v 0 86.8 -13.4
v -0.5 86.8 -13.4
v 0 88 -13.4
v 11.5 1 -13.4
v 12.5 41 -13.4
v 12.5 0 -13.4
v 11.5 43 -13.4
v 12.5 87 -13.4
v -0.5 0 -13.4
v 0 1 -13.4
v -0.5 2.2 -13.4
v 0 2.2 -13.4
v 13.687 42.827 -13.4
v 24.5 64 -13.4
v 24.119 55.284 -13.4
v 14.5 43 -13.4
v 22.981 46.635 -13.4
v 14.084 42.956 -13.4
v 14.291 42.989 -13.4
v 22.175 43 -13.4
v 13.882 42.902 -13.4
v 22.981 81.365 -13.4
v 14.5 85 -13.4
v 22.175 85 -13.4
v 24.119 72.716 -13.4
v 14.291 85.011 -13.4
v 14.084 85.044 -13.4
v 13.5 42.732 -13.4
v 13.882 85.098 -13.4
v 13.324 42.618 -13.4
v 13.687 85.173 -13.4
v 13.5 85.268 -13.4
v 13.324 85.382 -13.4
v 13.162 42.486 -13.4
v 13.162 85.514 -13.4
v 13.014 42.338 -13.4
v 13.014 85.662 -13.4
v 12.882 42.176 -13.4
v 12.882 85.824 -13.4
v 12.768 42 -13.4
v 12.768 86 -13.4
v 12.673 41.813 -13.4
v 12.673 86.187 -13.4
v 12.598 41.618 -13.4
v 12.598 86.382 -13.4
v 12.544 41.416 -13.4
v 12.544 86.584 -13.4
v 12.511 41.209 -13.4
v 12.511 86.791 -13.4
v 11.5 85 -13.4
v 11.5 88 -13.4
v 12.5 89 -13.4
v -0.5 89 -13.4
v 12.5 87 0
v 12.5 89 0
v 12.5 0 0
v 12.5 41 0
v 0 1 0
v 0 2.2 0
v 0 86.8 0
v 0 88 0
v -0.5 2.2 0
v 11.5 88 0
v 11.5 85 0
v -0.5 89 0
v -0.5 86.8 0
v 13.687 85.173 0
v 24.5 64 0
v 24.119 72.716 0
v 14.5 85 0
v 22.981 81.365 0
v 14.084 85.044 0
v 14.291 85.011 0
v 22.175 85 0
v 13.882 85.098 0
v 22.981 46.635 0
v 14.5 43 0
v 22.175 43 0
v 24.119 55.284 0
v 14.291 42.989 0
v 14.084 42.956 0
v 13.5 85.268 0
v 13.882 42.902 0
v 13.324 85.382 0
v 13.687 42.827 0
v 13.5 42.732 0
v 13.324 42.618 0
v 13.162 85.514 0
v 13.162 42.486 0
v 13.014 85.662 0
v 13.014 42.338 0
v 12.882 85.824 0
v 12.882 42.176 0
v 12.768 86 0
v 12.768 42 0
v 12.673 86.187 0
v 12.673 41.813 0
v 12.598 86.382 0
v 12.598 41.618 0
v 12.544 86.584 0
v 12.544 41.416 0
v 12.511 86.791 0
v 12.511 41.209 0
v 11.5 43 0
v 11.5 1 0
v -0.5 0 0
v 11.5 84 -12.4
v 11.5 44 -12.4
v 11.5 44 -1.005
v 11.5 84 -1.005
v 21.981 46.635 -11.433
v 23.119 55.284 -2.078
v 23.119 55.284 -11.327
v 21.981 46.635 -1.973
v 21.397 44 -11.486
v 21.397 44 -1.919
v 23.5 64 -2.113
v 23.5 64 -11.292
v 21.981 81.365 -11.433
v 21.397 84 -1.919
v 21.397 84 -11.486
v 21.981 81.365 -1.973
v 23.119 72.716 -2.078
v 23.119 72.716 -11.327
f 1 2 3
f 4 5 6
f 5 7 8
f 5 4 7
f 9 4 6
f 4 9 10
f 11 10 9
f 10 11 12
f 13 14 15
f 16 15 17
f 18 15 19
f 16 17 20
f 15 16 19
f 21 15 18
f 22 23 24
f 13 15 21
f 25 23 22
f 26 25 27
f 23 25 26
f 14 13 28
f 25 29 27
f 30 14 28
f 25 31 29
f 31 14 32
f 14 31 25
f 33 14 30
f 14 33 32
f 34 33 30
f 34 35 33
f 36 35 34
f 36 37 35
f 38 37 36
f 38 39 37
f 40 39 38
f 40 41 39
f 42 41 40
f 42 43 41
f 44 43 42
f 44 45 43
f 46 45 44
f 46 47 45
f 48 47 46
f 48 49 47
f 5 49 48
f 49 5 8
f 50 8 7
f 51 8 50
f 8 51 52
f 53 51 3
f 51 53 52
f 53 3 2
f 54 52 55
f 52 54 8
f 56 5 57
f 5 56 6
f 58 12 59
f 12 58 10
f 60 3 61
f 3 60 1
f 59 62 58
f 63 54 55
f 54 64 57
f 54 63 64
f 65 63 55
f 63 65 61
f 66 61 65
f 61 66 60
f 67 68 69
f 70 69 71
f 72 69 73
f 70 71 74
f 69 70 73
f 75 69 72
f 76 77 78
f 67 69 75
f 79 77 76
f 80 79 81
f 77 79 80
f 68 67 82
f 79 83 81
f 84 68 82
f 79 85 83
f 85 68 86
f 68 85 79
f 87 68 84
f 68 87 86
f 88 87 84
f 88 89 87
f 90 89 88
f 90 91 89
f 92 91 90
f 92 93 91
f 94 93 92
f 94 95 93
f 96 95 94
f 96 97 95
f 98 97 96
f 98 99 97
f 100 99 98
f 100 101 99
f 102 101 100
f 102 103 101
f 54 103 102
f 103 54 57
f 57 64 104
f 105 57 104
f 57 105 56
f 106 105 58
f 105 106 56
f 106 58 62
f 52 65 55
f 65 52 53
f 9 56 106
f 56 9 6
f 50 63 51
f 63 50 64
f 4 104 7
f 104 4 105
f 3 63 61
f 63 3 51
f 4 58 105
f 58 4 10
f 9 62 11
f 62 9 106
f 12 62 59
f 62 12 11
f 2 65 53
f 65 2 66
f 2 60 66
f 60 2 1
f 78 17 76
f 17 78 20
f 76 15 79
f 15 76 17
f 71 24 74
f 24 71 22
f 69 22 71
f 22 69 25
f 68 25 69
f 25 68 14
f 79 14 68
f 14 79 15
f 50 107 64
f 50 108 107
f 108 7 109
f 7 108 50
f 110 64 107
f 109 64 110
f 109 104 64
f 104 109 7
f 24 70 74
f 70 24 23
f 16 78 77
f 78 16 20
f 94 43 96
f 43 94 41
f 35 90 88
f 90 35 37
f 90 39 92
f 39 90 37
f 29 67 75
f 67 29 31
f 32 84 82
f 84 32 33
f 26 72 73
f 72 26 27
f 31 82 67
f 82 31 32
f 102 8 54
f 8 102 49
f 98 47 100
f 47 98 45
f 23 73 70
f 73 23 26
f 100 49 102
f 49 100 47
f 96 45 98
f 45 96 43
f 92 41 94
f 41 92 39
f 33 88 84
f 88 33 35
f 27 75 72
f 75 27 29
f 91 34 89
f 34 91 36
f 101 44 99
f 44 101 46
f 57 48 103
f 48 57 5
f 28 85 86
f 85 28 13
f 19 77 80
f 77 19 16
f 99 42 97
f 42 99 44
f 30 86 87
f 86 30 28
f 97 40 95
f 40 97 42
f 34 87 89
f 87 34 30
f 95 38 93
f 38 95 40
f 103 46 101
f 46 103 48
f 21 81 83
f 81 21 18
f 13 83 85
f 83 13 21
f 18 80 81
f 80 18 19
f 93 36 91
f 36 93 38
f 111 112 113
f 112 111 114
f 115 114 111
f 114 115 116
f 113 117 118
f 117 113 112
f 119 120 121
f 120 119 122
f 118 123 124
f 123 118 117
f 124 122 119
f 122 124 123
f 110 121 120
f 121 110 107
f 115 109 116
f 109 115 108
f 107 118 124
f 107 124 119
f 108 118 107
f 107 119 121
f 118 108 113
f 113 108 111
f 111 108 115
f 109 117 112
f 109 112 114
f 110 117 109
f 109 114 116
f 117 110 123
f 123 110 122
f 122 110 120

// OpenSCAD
// Switch cover
// Paul Murrin - Sept 2013

// (mm)
HeightOfSocket = 87;
// (mm) 
DepthOfSocket = 11.5;
// (mm)
HeightToBottomOfSwitch = 48;
// (mm)
WidthOfSwitch = 10;
// (mm)
DepthOfSwitch = 5;
// The clip helps to grip the switch plate. If not possible, use blue tack.
IncludeClips = true;

/* [Hidden] */

Thickness = 1;			// Thickness of cover
WidthExtraMargin = 0.5;	// Additional tolerance on width of cover.
Taper = 1.2;				// Amount which switch cover tapers (helps make it printable without massive overhang)
ClipLength = Thickness + 1.2;	// Length of clip that helps hold it on 
ClipThickness = 0.5;
WidthAtBase = WidthOfSwitch + 2*WidthExtraMargin + 2*Taper;
HeightOfCover=DepthOfSwitch+7;	// Height of the inside of the cover
LengthOfCover=40;	// Length of the inside of the cover
HeightToStartOfCover = HeightToBottomOfSwitch - 5 - Thickness;
FilletRadius = 2;
$fa=5;



rotate([0,90,0])
	union()
	{
		// Main body and cutout
		difference()
		{
			cube([WidthAtBase, HeightOfSocket+2*Thickness, DepthOfSocket + Thickness]);
			translate([0,Thickness,0])
				cube([WidthAtBase, HeightOfSocket, DepthOfSocket]);
			// Cutout for coverplate
			translate([0,Thickness + HeightToStartOfCover,DepthOfSocket])
				cube([WidthAtBase, LengthOfCover+2*Thickness, Thickness]);
		}
	
		// Clips to grip coverplate
		if (IncludeClips)
		{
			translate([0,0,-ClipThickness])
				cube([WidthAtBase, ClipLength, ClipThickness]);
			translate([0,HeightOfSocket+2*Thickness-ClipLength,-ClipThickness])
				cube([WidthAtBase, ClipLength, ClipThickness]);
		}
	
		
		// Cover bulge
		translate([0,HeightToStartOfCover+Thickness,DepthOfSocket])
		{
			difference()
			{
				union()
				{
					intersection()
					{
						translate([0,LengthOfCover/2+Thickness,(HeightOfCover+Thickness)-100])
							rotate([0,90,0])
								cylinder(r=100, h=WidthAtBase);
						cube([WidthAtBase,LengthOfCover+2*Thickness,HeightOfCover+Thickness]);
					}
					// Fillet at top
					translate([0,LengthOfCover+2*Thickness,Thickness])
						difference()
						{	
							cube([WidthAtBase,FilletRadius,FilletRadius]);
							translate([-0.01,FilletRadius,FilletRadius])	
								rotate([0,90,0])
									cylinder(r=FilletRadius, h=WidthAtBase+0.02, $fn=60);
						}
					// Fillet at bottom
					translate([0,-FilletRadius,Thickness])
						difference()
						{	
							cube([WidthAtBase,FilletRadius,FilletRadius]);
							#translate([-0.01,0,FilletRadius])	
								rotate([0,90,0])
									cylinder(r=FilletRadius, h=WidthAtBase+0.02, $fn=60);
						}
	
				}
				// Taper the cover
/*				translate([WidthAtBase,-FilletRadius, 0])
					rotate([0,-atan2(Taper, HeightOfCover+Thickness),0])
						cube([Taper,LengthOfCover+2*Thickness+2*FilletRadius,HeightOfCover+Thickness+10]);
				translate([-Taper,-FilletRadius, 0])
					rotate([0,atan2(Taper, HeightOfCover+Thickness),0])
						cube([Taper,LengthOfCover+2*Thickness+2*FilletRadius,HeightOfCover+Thickness+10]);
*/		
				// Cutout inside of cover
				difference()
				{
					intersection()
					{
						translate([Thickness,(LengthOfCover/2)+Thickness,HeightOfCover-100])
							rotate([0,90,0])
								cylinder(r=100, h=WidthAtBase);
						translate([Thickness,Thickness, 0])
							cube([WidthAtBase-2*Thickness,LengthOfCover,HeightOfCover]);
					}
					// Taper the cover
					translate([WidthAtBase-Thickness,Thickness, 0])
						rotate([0,-atan2(Taper, HeightOfCover+Thickness),0])
							cube([Taper,LengthOfCover,HeightOfCover+10]);
					translate([Thickness-Taper,Thickness, 0])
						rotate([0,atan2(Taper, HeightOfCover+Thickness),0])
							cube([Taper,LengthOfCover,HeightOfCover+10]);
				}
		
			}
		}
	
	}
